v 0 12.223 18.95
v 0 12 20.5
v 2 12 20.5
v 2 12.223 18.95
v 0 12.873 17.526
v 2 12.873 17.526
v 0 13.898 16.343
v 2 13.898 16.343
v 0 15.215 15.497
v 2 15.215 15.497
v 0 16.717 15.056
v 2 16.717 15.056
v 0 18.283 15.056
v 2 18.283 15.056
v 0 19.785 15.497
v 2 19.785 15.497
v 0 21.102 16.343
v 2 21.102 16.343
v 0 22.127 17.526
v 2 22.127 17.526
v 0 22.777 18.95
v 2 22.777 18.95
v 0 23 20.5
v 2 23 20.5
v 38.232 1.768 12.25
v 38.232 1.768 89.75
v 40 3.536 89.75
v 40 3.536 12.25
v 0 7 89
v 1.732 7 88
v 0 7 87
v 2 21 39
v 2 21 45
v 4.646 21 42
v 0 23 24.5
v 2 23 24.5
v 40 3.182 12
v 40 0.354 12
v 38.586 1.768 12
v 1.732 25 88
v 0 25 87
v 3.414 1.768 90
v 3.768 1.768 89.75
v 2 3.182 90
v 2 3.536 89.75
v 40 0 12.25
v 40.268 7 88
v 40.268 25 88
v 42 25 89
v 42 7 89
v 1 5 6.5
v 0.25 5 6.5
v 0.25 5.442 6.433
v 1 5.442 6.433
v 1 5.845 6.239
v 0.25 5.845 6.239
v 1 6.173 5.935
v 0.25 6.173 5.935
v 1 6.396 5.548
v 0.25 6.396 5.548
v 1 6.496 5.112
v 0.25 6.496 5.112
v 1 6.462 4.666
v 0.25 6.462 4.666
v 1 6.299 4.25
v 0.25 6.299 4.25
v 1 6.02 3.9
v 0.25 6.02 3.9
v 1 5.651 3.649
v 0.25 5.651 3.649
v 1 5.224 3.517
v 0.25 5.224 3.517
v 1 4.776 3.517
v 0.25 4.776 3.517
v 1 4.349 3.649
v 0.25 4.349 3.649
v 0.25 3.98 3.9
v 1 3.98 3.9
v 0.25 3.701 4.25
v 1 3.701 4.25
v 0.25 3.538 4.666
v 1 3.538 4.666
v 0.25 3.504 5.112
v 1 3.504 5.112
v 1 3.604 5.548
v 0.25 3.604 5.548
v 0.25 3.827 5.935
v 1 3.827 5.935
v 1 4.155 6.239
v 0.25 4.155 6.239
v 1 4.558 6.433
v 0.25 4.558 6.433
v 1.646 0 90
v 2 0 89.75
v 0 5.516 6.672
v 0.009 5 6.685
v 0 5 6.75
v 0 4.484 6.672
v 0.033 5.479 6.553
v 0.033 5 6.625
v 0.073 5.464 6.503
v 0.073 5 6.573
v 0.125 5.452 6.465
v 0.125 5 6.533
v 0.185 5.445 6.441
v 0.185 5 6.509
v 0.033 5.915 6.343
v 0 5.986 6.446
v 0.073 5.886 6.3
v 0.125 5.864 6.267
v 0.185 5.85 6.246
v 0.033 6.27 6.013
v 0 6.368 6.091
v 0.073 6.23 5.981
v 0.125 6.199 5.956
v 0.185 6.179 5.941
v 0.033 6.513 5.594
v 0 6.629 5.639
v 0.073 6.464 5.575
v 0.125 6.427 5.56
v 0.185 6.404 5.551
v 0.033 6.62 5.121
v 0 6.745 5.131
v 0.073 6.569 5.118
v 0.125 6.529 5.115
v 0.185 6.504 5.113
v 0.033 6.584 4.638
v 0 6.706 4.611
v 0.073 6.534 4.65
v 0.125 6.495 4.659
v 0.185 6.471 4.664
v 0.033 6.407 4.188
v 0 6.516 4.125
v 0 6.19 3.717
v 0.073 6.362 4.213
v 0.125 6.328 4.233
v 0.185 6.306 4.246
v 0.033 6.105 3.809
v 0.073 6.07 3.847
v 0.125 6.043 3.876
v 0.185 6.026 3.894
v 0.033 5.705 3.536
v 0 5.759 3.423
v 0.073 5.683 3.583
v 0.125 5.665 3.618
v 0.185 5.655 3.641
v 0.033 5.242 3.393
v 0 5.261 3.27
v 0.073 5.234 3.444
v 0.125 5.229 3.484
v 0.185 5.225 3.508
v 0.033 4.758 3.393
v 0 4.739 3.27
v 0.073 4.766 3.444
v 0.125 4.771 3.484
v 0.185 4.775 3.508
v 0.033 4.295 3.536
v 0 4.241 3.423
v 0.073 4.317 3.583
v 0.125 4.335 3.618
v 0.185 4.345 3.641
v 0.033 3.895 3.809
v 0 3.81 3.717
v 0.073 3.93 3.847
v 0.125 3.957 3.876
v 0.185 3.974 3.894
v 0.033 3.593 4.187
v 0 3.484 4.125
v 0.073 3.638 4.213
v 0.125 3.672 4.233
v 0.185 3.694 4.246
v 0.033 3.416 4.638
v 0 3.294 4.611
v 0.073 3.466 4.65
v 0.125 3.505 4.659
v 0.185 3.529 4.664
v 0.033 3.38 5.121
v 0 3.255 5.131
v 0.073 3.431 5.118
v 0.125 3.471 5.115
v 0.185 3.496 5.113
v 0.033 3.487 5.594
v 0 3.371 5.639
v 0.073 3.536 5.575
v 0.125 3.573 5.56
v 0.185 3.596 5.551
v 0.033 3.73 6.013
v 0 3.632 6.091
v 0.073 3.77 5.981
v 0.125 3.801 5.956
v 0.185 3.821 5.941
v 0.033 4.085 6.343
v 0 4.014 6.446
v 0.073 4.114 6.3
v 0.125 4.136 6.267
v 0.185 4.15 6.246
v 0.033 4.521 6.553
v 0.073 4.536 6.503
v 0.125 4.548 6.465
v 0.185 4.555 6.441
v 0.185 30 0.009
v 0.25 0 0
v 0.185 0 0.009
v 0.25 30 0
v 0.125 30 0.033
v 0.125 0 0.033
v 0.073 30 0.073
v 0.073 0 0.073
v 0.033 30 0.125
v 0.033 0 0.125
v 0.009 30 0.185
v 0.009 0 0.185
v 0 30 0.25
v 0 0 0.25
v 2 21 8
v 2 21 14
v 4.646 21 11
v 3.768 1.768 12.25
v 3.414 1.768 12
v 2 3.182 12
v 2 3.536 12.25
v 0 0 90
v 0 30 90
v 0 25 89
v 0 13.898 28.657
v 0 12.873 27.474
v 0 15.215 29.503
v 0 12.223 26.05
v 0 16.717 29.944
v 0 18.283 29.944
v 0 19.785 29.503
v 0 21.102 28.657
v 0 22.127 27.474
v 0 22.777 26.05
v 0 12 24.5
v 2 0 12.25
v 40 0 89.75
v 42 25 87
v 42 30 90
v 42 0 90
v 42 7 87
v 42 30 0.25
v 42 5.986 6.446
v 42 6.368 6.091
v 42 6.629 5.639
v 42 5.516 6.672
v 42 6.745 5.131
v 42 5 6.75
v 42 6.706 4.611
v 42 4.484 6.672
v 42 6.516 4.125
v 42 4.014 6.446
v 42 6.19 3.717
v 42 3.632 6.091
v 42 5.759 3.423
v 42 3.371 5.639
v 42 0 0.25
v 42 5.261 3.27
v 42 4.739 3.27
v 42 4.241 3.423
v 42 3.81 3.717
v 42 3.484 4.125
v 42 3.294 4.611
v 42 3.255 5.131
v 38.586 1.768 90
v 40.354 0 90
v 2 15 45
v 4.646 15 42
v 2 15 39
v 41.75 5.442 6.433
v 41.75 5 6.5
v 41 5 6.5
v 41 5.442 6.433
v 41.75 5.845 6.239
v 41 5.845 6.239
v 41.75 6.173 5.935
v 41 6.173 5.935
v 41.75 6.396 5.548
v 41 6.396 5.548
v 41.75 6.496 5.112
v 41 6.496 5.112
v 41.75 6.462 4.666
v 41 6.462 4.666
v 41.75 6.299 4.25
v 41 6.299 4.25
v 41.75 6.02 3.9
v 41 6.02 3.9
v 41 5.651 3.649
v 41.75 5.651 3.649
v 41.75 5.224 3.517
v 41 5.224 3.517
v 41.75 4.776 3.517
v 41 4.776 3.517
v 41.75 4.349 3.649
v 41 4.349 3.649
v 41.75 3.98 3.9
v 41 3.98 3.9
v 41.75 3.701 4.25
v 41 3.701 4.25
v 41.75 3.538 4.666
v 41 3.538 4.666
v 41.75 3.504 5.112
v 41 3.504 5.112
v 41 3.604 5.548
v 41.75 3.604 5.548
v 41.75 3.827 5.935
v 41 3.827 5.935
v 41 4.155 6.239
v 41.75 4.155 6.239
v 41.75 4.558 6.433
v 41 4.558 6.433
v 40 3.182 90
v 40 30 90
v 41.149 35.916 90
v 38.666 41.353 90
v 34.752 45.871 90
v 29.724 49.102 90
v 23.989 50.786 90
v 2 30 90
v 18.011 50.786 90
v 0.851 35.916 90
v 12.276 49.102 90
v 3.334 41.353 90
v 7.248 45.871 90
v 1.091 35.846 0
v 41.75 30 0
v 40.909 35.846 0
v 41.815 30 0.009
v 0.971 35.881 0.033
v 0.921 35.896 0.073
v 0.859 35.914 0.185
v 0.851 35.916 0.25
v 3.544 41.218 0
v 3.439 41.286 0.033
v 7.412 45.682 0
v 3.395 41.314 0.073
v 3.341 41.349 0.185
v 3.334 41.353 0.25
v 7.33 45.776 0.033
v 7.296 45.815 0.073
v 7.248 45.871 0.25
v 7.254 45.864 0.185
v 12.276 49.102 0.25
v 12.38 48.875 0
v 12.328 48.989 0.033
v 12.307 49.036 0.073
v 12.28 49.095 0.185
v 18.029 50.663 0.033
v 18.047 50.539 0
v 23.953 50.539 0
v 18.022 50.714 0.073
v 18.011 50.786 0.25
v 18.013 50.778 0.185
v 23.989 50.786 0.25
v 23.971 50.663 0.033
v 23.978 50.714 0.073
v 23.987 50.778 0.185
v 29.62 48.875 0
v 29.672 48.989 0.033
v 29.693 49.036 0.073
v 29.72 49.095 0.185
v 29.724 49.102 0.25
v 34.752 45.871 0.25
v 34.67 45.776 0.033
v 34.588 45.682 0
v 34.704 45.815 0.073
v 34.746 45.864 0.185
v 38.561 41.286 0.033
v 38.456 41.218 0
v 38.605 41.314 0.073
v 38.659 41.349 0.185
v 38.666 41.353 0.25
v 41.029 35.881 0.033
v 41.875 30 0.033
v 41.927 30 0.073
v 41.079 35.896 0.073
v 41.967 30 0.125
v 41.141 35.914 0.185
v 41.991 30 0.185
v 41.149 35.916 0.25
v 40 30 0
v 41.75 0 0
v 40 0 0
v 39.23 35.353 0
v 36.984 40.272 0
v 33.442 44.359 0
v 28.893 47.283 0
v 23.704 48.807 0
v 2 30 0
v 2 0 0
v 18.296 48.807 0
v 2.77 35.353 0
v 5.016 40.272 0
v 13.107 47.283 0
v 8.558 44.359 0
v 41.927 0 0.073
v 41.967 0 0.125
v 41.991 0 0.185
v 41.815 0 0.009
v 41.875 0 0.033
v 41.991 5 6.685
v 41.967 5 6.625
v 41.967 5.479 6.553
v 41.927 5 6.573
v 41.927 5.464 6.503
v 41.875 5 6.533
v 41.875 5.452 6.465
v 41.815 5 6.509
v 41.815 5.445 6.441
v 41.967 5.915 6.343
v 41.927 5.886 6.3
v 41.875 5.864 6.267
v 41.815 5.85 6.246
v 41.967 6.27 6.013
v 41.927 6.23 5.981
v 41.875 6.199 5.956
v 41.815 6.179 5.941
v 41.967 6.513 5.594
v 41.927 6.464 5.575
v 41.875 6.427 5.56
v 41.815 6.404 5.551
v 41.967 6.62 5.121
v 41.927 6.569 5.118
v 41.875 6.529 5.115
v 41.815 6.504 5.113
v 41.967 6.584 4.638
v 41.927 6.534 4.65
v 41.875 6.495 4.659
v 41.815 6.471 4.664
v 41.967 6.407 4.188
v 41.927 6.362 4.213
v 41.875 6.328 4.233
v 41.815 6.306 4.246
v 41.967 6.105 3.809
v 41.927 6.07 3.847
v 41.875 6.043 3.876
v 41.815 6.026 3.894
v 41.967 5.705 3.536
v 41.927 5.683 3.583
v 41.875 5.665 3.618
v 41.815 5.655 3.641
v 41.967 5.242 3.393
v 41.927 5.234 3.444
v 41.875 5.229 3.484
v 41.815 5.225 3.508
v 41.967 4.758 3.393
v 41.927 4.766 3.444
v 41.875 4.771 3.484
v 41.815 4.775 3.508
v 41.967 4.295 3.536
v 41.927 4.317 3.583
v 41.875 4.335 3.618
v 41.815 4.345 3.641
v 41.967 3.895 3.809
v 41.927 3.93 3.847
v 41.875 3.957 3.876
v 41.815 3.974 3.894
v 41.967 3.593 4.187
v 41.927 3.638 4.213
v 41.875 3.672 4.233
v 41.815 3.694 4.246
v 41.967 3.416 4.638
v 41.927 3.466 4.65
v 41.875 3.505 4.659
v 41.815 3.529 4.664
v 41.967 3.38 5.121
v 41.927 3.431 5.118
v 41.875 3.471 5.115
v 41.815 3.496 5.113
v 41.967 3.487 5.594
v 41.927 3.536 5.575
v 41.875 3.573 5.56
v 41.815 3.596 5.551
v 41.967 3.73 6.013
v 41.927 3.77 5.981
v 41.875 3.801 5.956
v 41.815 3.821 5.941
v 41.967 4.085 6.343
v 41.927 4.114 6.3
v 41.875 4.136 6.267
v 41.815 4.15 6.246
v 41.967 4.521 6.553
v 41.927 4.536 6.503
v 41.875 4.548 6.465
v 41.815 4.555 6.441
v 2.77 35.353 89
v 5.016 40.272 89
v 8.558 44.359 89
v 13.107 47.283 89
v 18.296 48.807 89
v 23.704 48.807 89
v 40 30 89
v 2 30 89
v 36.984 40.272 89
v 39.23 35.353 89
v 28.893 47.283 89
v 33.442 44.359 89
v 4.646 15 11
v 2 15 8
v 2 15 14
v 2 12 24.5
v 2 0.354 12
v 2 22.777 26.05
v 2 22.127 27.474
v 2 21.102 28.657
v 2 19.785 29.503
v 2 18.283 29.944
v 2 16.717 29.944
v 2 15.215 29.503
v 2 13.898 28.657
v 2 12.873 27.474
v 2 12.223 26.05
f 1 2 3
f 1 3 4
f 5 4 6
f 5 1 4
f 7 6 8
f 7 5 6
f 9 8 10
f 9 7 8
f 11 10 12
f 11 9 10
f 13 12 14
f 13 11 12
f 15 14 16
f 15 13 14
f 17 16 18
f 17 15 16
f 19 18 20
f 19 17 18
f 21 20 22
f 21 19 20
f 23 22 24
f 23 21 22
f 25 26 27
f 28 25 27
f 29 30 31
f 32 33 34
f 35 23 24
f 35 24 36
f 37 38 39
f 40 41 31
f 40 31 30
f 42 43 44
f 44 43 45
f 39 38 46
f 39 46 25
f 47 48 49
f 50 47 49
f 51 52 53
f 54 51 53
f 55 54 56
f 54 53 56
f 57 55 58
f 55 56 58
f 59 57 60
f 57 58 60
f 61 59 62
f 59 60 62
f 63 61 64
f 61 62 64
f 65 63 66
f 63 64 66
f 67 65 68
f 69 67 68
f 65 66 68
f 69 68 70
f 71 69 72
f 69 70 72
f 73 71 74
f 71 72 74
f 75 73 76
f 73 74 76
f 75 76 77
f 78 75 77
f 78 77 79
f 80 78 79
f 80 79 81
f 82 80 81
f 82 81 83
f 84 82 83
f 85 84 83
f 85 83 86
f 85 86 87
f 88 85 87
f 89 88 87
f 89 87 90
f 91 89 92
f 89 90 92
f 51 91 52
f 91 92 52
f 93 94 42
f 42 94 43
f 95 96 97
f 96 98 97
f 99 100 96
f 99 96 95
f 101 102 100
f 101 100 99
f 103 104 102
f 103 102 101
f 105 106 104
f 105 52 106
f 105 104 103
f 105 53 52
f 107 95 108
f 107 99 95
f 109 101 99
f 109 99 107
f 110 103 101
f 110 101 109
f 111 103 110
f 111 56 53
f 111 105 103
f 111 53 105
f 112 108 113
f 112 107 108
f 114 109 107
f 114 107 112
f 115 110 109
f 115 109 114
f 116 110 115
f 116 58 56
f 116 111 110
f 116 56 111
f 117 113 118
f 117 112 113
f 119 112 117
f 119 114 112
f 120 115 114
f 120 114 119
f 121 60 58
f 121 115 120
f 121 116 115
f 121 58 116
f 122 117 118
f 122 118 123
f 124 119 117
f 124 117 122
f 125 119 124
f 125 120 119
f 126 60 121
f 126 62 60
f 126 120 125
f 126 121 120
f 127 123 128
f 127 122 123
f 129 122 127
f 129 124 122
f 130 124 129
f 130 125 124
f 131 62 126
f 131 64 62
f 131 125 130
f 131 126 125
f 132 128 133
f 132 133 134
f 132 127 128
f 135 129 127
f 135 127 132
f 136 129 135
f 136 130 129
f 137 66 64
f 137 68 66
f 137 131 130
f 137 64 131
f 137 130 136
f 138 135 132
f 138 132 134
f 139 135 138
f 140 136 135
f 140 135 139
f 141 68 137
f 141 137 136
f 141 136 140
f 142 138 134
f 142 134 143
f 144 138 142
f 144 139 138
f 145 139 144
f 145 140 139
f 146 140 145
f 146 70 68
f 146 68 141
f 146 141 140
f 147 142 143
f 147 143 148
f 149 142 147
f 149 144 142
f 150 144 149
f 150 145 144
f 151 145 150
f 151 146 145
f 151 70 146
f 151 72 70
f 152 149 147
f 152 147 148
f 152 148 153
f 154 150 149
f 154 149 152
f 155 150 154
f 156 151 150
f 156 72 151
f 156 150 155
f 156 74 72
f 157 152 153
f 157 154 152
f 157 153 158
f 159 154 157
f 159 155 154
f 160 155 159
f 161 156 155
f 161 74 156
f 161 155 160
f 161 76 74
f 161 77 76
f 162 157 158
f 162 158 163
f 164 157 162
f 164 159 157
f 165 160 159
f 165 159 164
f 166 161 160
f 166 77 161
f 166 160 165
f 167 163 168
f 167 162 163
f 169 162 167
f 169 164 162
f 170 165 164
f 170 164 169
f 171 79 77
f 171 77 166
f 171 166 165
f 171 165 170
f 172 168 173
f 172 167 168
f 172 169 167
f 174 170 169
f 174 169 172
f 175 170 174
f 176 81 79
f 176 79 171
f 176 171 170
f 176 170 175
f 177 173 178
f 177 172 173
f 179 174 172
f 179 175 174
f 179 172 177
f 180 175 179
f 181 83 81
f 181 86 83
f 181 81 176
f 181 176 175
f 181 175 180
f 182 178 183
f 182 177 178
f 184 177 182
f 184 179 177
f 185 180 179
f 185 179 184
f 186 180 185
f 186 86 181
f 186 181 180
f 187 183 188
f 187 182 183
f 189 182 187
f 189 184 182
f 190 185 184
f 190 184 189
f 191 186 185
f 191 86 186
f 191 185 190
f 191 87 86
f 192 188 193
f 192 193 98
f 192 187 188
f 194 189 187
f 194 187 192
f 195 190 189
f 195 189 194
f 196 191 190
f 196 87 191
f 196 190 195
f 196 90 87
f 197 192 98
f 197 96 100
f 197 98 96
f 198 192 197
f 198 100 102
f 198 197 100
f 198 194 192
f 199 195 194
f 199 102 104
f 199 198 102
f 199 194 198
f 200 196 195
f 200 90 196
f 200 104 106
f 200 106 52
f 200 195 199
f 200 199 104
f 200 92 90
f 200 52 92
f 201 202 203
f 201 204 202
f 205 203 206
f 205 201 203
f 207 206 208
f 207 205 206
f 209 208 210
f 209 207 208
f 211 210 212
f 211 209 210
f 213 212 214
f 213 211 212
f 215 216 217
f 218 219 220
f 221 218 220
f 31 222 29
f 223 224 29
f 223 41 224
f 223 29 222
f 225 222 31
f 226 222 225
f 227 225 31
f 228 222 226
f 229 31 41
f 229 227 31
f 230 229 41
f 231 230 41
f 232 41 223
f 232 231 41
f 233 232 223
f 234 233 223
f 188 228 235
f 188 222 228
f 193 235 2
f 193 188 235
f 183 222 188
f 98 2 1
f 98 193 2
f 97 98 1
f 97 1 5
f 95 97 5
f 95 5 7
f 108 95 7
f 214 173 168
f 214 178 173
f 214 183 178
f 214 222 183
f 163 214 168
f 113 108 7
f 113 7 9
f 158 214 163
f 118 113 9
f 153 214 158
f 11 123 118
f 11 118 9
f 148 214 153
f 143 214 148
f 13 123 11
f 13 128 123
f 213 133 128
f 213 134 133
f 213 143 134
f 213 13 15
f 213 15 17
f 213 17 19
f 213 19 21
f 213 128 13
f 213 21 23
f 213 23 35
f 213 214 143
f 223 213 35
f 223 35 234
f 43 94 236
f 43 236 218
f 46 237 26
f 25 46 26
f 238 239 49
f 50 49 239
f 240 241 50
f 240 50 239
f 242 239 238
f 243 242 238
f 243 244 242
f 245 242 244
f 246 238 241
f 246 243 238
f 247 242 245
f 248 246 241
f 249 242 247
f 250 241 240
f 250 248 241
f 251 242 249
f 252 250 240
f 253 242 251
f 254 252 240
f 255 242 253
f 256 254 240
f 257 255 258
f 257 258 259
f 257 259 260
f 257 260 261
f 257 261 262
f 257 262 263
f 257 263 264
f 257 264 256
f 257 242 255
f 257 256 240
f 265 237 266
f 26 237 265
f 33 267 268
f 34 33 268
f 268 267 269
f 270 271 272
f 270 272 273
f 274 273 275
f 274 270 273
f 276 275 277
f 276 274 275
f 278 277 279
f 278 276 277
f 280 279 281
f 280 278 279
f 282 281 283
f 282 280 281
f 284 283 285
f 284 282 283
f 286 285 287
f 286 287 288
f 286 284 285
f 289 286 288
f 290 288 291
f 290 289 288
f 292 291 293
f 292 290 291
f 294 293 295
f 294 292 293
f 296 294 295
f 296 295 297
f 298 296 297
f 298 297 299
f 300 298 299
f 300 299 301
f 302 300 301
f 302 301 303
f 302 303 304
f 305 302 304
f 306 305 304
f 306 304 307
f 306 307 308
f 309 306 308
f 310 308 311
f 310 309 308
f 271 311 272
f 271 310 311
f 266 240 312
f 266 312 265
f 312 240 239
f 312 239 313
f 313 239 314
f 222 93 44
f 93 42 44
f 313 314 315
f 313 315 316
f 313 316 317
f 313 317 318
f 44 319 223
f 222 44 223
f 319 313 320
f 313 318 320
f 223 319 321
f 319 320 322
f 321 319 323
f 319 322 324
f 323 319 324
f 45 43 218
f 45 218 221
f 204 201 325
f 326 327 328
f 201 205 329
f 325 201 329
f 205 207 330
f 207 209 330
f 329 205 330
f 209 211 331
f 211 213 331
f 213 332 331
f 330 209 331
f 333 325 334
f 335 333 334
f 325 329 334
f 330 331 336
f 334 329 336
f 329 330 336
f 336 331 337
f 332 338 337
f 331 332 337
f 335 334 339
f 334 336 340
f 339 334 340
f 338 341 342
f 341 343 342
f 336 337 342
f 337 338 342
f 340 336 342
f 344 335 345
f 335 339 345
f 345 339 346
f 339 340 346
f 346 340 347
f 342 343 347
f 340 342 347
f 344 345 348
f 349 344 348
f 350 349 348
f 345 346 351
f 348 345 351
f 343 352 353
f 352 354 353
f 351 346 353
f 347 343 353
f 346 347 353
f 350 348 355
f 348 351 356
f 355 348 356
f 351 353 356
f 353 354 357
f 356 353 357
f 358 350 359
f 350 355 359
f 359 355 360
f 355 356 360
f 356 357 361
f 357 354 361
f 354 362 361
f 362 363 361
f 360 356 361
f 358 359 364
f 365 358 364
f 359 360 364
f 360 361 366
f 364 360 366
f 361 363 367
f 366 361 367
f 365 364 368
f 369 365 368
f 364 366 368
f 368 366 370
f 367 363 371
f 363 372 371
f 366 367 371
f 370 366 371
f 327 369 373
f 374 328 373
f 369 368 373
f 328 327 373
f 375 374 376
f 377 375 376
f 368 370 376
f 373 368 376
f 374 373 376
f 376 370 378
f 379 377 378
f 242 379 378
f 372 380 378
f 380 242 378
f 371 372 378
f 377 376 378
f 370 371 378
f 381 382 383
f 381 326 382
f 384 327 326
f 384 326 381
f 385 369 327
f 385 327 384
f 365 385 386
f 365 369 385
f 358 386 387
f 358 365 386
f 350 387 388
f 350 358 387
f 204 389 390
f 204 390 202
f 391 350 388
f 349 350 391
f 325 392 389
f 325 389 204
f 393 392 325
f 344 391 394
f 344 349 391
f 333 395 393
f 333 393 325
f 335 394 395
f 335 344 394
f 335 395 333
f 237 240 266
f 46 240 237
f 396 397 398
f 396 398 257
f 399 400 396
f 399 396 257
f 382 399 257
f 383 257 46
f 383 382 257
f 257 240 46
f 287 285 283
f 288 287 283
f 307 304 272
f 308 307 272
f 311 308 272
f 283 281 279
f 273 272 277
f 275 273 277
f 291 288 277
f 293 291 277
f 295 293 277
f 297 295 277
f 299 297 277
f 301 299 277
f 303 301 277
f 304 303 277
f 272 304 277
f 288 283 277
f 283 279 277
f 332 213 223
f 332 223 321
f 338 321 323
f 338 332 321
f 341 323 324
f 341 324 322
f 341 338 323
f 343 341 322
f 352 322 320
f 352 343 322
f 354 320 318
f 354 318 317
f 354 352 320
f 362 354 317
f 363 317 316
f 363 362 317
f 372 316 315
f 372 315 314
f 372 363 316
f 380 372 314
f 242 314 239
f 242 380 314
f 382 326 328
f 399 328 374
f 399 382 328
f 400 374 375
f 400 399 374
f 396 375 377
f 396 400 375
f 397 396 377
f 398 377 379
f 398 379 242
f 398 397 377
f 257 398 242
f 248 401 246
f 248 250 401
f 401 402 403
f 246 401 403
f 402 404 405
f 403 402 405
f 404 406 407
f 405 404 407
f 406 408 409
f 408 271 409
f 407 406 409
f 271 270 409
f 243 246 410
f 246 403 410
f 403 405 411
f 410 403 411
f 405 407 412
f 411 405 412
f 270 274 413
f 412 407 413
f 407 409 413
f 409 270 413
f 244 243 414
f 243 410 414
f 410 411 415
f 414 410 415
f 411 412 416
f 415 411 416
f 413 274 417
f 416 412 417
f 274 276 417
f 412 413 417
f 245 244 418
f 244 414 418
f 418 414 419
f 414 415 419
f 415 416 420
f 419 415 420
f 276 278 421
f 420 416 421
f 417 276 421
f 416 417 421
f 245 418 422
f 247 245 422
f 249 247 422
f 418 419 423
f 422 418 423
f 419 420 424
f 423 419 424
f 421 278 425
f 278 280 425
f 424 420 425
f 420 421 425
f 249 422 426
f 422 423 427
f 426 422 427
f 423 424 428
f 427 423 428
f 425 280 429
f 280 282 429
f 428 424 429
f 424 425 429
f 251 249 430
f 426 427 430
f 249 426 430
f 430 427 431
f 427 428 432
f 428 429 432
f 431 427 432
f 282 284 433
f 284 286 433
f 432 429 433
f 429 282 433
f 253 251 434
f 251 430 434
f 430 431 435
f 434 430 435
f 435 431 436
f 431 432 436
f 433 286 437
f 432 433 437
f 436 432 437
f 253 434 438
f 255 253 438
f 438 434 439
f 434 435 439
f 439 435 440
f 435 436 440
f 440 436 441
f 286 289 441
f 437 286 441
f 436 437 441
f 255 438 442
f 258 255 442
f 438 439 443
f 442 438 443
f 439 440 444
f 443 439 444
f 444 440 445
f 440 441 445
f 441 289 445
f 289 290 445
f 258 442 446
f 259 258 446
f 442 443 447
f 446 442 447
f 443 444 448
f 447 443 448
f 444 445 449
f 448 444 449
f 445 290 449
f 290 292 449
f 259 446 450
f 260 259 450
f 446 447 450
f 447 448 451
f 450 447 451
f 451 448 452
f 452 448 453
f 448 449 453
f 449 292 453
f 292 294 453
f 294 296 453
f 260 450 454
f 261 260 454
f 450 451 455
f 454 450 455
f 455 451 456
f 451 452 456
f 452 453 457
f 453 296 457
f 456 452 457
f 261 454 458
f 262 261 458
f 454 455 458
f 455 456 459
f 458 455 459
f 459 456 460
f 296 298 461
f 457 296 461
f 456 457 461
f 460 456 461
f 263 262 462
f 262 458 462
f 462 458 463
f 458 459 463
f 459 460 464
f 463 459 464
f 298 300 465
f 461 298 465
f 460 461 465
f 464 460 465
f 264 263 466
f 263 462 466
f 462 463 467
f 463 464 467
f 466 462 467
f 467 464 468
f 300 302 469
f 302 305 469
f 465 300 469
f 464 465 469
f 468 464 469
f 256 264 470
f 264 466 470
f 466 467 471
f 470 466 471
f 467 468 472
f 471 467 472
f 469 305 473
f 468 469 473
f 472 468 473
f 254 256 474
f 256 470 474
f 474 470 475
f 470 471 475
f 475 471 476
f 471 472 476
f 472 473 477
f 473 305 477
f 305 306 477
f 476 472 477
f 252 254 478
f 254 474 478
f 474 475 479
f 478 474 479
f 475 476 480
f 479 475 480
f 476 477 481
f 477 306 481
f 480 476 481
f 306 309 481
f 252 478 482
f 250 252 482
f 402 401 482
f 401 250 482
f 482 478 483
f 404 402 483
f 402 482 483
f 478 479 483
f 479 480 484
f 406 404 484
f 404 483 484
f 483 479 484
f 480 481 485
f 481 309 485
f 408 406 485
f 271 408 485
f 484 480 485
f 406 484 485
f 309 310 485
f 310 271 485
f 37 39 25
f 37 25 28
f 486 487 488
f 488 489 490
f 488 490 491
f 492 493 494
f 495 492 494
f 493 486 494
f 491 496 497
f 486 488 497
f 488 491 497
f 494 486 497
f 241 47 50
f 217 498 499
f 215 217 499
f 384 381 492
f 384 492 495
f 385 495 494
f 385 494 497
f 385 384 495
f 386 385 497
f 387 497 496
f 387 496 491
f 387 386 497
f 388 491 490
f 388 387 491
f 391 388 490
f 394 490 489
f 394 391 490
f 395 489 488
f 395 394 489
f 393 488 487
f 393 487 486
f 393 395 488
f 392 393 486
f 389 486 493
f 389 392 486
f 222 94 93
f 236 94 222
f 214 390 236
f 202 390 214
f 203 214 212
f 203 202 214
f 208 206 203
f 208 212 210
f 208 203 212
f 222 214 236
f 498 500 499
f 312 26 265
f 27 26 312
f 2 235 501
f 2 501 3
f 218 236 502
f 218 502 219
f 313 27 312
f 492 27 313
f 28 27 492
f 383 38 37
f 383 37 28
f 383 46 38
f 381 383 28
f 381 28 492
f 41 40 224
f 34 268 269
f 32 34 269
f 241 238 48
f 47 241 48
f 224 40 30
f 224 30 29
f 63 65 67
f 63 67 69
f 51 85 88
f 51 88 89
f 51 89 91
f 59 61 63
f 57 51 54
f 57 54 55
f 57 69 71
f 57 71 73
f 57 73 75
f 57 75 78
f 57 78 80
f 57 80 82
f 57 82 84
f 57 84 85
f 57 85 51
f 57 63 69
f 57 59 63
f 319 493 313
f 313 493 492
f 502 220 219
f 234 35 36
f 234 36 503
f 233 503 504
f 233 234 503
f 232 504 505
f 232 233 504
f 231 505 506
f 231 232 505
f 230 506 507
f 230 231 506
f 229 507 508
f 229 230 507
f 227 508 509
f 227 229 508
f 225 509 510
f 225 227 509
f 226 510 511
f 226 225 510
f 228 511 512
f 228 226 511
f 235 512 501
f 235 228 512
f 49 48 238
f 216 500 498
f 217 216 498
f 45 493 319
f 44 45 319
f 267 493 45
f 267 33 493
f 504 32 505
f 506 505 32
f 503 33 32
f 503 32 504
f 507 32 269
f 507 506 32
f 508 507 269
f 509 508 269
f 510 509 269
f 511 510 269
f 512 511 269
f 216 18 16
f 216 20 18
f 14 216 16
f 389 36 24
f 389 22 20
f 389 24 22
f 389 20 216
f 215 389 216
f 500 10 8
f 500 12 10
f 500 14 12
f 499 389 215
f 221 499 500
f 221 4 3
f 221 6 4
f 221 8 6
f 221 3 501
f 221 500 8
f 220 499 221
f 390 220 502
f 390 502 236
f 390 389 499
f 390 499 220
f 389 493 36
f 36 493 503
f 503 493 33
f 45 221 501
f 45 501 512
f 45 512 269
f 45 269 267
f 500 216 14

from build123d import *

# Parameters (mm, degrees)
BOSS_EXTRUDE1_DEPTH = 90
BOSS_EXTRUDE2_START = -1
BOSS_EXTRUDE2_DEPTH = 1
CUT_EXTRUDE2_DEPTH  = 2
SKETCH6_R           = 1.5
CUT_EXTRUDE3_DEPTH  = 1
CUT_EXTRUDE4_DEPTH  = 18
BOSS_EXTRUDE3_DEPTH = 78
BOSS_EXTRUDE4_START = -8
BOSS_EXTRUDE4_DEPTH = 6
FILLET2_R           = 0.25
CHAMFER1_SIZE       = 0.25
FILLET3_R           = 0.25
CHAMFER2_SIZE       = 0.25


with BuildPart() as part:
    # Sketch2 → Boss-Extrude1 (new body)
    with BuildSketch(Plane.XY):
        with BuildLine():
            Line((0, 0), (0, 30))
            ThreePointArc((0, 30), (21, 51), (42, 30))
            Line((42, 30), (42, 0))
            Line((42, 0), (40, 0))
            Line((40, 0), (40, 30))
            ThreePointArc((40, 30), (21, 49), (2, 30))
            Line((2, 30), (2, 0))
            Line((2, 0), (0, 0))
        make_face()
    extrude(amount=BOSS_EXTRUDE1_DEPTH)

    # Sketch3 → Boss-Extrude2 (add)
    with BuildSketch(Plane.XY.offset(90).offset(BOSS_EXTRUDE2_START)):
        with BuildLine():
            Line((2, 30), (40, 30))
            ThreePointArc((40, 30), (21, 49), (2, 30))
        make_face()
    extrude(amount=BOSS_EXTRUDE2_DEPTH)

    # Sketch5 → Cut-Extrude2 (cut)
    with BuildSketch(Plane.ZY):
        with BuildLine():
            Line((20.5, 23), (24.5, 23))
            ThreePointArc((24.5, 23), (30, 17.5), (24.5, 12))
            Line((24.5, 12), (20.5, 12))
            ThreePointArc((20.5, 12), (15, 17.5), (20.5, 23))
        make_face()
    extrude(amount=-CUT_EXTRUDE2_DEPTH, mode=Mode.SUBTRACT)

    # Sketch6 → Cut-Extrude3 (cut)
    with BuildSketch(Plane.ZY):
        with Locations((5, 5)):
            Circle(SKETCH6_R)
    cut_extrude3 = extrude(amount=-CUT_EXTRUDE3_DEPTH, mode=Mode.SUBTRACT)

    # Mirror1: Cut-Extrude3 across plane
    add(cut_extrude3.mirror(Plane(origin=(21, 0, 0), x_dir=(0, 0, 1), z_dir=(1, 0, 0))), mode=Mode.SUBTRACT)

    # Sketch7 → Cut-Extrude4 (cut)
    with BuildSketch(Plane(origin=(0, 7, 0), x_dir=(-1, 0, 0), z_dir=(0, -1, 0))):
        Polygon((0, -89), (0, -87), (-1.732050808, -88), align=None)
    cut_extrude4 = extrude(amount=-CUT_EXTRUDE4_DEPTH, mode=Mode.SUBTRACT)

    # Mirror2: Cut-Extrude4 across plane
    add(cut_extrude4.mirror(Plane(origin=(21, 0, 0), x_dir=(0, 0, 1), z_dir=(1, 0, 0))), mode=Mode.SUBTRACT)

    # Sketch8 → Boss-Extrude3 (add)
    with BuildSketch(Plane.XY.offset(90)):
        Polygon((2, 0), (3.767766953, 1.767766953), (2, 3.535533906), align=None)
    boss_extrude3 = extrude(amount=-BOSS_EXTRUDE3_DEPTH)

    # Mirror3: Boss-Extrude3 across plane
    add(boss_extrude3.mirror(Plane(origin=(21, 0, 0), x_dir=(0, 0, 1), z_dir=(1, 0, 0))))

    # Sketch9 → Boss-Extrude4 (add)
    with BuildSketch(Plane(origin=(0, 7, 0), x_dir=(-1, 0, 0), z_dir=(0, -1, 0)).offset(BOSS_EXTRUDE4_START)):
        Polygon((-2, -8), (-2, -14), (-4.645751311, -11), align=None)
        Polygon((-2, -39), (-2, -45), (-4.645751311, -42), align=None)
    extrude(amount=-BOSS_EXTRUDE4_DEPTH)

    # Fillet2
    fillet2_edges = [part.edges().sort_by_distance(p)[0] for p in [
        (0, 5, 3.5),
        (42, 5, 3.5),
    ]]
    fillet(fillet2_edges, radius=FILLET2_R)

    # Chamfer1
    chamfer1_edges = [part.edges().sort_by_distance(p)[0] for p in [
        (2.883883476, 2.651650429, 12),
        (2.883883476, 2.651650429, 90),
        (2.883883476, 0.883883476, 90),
        (39.116116524, 2.651650429, 90),
        (39.116116524, 0.883883476, 90),
        (39.116116524, 2.651650429, 12),
    ]]
    chamfer(chamfer1_edges, length=CHAMFER1_SIZE)

    # Fillet3
    fillet3_edges = [part.edges().sort_by_distance(p)[0] for p in [
        (0, 15, 0),
        (21, 51, 0),
        (42, 15, 0),
    ]]
    fillet(fillet3_edges, radius=FILLET3_R)

    # Chamfer2
    chamfer2_edges = [part.edges().sort_by_distance(p)[0] for p in [
        (2.795495129, 0.795495129, 12),
        (39.204504871, 0.795495129, 12),
    ]]
    chamfer(chamfer2_edges, length=CHAMFER2_SIZE)


solid = part.part
